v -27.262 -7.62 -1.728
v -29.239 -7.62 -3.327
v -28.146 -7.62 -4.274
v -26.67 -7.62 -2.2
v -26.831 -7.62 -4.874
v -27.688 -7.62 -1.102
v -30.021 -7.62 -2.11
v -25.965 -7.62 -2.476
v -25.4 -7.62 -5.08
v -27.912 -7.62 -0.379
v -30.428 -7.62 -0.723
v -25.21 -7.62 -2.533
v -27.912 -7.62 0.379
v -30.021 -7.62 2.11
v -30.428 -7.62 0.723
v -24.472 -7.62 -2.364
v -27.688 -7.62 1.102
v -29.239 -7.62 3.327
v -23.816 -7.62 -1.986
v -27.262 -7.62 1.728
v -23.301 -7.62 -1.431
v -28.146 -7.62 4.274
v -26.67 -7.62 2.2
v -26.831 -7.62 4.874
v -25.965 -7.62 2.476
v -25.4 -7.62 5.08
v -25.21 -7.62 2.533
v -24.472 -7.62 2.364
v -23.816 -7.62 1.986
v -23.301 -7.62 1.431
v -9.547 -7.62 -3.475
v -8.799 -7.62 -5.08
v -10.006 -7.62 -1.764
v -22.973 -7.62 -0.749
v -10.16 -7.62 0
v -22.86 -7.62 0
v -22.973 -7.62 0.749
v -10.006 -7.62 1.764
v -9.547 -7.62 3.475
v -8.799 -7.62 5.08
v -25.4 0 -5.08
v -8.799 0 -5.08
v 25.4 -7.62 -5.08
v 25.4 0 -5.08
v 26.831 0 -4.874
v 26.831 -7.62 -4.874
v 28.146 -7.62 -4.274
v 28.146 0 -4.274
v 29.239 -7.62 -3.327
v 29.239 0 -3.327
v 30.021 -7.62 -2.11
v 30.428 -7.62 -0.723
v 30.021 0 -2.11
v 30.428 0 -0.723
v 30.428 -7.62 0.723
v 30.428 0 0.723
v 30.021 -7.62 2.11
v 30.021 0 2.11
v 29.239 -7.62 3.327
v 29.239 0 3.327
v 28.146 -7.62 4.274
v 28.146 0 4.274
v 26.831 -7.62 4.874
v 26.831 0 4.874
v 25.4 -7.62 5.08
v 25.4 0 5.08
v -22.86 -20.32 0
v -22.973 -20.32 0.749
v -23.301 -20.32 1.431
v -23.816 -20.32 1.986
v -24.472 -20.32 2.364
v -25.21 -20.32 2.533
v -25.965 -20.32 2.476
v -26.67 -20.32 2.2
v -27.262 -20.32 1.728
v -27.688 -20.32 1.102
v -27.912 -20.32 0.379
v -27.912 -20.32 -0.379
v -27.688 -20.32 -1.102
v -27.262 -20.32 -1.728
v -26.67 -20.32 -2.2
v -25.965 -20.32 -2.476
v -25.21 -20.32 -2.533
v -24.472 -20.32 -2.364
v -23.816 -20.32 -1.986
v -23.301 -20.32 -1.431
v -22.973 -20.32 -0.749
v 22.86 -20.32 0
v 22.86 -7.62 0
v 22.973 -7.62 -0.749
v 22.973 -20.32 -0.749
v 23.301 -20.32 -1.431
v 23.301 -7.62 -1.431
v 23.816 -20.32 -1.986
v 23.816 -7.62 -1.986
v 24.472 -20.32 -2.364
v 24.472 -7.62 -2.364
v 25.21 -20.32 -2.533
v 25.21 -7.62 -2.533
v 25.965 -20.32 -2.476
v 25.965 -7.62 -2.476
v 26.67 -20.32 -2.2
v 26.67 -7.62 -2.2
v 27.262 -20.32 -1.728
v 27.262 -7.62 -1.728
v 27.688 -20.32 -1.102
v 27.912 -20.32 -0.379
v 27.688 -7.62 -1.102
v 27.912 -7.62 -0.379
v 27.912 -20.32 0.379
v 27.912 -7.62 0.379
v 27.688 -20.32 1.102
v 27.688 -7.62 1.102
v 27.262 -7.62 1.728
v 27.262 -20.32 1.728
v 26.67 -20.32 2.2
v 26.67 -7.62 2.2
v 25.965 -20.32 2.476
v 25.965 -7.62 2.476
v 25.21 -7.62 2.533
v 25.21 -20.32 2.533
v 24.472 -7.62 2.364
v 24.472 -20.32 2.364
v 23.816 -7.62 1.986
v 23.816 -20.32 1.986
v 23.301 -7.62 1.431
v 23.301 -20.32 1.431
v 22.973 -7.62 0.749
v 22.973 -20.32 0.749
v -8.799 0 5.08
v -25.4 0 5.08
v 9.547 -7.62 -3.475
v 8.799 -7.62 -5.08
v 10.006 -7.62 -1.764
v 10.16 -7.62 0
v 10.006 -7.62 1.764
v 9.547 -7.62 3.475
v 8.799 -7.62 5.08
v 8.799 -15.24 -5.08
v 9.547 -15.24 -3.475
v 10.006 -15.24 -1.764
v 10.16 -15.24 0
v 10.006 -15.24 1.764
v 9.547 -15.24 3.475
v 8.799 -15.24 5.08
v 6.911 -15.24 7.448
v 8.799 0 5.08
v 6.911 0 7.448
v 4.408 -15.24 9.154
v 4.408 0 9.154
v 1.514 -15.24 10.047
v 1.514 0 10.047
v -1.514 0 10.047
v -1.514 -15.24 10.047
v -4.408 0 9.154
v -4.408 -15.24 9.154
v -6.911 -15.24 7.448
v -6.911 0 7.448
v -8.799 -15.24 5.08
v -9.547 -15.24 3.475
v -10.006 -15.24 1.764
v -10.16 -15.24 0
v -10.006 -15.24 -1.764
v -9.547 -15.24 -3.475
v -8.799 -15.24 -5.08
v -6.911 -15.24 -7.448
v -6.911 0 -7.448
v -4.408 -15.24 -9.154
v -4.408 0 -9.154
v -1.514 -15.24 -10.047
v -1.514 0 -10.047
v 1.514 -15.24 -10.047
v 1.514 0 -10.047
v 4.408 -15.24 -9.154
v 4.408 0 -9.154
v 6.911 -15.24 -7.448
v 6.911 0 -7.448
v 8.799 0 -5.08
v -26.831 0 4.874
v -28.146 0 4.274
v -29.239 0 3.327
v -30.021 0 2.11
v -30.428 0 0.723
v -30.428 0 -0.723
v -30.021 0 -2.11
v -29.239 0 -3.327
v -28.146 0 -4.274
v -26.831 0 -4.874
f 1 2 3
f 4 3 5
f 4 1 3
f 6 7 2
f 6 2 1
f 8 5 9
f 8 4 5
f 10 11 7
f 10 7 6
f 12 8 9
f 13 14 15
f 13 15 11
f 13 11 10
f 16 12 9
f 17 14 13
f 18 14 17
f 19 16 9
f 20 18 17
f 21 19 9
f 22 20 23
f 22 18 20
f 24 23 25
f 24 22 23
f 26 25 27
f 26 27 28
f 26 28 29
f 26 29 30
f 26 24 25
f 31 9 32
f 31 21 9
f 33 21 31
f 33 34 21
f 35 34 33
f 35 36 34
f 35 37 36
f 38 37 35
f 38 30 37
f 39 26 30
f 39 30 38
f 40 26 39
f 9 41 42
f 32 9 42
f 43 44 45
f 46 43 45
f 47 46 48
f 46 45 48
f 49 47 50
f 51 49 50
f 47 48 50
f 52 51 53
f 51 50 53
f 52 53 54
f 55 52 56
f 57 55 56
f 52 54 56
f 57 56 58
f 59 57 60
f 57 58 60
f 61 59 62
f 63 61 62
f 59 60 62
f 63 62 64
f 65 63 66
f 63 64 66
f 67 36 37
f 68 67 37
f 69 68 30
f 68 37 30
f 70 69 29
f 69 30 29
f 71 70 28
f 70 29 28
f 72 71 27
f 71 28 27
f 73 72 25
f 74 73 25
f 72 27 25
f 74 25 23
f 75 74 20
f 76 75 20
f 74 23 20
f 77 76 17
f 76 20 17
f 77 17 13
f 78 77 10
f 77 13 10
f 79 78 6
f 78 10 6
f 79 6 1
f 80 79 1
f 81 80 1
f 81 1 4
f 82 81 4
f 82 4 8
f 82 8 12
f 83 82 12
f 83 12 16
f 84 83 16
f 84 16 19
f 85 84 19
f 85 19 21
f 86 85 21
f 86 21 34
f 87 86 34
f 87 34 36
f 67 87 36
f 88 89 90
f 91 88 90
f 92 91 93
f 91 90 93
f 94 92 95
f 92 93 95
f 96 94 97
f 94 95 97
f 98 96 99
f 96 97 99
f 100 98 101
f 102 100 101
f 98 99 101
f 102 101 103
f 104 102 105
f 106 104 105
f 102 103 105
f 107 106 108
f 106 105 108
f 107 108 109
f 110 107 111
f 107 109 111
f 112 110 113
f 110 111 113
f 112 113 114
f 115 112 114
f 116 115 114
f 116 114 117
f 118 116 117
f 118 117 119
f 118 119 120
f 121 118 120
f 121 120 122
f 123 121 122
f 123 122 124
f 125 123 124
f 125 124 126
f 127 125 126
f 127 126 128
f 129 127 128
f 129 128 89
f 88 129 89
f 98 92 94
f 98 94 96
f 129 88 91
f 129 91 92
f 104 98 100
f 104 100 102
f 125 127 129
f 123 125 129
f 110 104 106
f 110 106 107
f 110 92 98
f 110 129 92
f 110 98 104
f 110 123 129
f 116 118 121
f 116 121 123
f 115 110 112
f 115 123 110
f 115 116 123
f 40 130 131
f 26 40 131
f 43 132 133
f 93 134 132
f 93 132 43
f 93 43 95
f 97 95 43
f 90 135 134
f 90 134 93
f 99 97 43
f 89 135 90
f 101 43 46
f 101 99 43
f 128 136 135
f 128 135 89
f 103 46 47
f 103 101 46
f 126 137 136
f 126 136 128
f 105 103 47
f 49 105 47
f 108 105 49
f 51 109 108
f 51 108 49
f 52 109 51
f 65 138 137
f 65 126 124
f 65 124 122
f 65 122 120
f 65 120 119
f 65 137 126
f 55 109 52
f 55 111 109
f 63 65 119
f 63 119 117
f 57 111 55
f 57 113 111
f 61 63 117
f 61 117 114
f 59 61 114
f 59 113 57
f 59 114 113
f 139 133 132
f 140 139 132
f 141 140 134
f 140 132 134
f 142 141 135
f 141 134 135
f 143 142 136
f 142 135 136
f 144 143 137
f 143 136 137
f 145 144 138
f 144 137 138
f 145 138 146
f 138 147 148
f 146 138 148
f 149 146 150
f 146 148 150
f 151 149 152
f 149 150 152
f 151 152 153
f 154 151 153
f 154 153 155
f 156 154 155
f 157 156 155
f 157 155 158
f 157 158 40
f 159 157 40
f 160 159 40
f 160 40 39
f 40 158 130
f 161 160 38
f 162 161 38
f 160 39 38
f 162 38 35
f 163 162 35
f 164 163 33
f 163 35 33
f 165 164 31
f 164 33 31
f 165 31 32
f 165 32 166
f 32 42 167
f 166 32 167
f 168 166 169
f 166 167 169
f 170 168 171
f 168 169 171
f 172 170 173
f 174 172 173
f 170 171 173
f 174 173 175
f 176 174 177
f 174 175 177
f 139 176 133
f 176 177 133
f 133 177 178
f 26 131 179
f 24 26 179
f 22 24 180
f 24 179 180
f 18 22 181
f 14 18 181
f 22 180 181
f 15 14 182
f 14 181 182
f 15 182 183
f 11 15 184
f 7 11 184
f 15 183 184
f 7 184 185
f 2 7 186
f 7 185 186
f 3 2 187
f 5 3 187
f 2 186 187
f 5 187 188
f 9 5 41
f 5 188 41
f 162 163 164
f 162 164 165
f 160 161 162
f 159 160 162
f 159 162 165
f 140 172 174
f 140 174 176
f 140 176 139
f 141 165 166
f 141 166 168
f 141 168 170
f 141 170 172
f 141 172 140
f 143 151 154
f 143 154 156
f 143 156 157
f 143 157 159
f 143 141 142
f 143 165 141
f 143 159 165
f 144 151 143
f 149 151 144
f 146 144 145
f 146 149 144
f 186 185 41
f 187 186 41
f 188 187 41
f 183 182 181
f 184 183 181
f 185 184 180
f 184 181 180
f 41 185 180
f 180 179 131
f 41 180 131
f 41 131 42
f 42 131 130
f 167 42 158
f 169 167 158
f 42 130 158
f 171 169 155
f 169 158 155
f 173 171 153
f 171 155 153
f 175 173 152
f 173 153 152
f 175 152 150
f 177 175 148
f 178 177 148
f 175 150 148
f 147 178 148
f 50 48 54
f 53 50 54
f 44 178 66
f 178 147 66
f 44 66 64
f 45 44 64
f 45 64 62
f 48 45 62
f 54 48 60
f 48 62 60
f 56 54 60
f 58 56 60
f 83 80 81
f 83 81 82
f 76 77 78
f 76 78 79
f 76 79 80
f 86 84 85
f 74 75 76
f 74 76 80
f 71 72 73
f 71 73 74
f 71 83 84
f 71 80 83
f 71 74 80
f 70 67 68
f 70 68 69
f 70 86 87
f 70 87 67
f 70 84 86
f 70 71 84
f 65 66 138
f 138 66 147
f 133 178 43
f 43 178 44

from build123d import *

# Parameters (mm, degrees)
F0_R     = 2.54
F1_DEPTH = 7.62
F2_DEPTH = 15.24
F3_DEPTH = 20.32


with BuildPart() as f1:
    # F0 (on Front) → F1 (new body)
    with BuildSketch(Plane.XZ):
        with BuildLine():
            ThreePointArc((-8.7988181024, -5.08), (-9.8138063951, -2.6296014982), (-10.16, 0))
            ThreePointArc((-10.16, 0), (-9.8138063951, 2.6296014982), (-8.7988181024, 5.08))
            Line((-8.7988181024, 5.08), (-25.4, 5.08))
            ThreePointArc((-25.4, 5.08), (-30.48, 0), (-25.4, -5.08))
            Line((-25.4, -5.08), (-8.7988181024, -5.08))
        make_face()
        with Locations((-25.4, 0)):
            Circle(F0_R, mode=Mode.SUBTRACT)
        with Locations((-25.4, 0)):
            Circle(F0_R)
        with BuildLine():
            Line((-10.16, 0), (10.16, 0))
            ThreePointArc((10.16, 0), (9.8138063951, 2.6296014982), (8.7988181025, 5.08))
            Line((8.7988181025, 5.08), (-8.7988181024, 5.08))
            ThreePointArc((-8.7988181024, 5.08), (-9.8138063951, 2.6296014982), (-10.16, 0))
        make_face()
        with BuildLine():
            ThreePointArc((8.7988181025, -5.08), (9.8138063951, -2.6296014982), (10.16, 0))
            Line((10.16, 0), (-10.16, 0))
            ThreePointArc((-10.16, 0), (-9.8138063951, -2.6296014982), (-8.7988181024, -5.08))
            Line((-8.7988181024, -5.08), (8.7988181025, -5.08))
        make_face()
        with BuildLine():
            ThreePointArc((8.7988181025, 5.08), (9.8138063951, 2.6296014982), (10.16, 0))
            ThreePointArc((10.16, 0), (9.8138063951, -2.6296014982), (8.7988181025, -5.08))
            Line((8.7988181025, -5.08), (25.4, -5.08))
            ThreePointArc((25.4, -5.08), (30.48, 0), (25.4, 5.08))
            Line((25.4, 5.08), (8.7988181025, 5.08))
        make_face()
        with BuildLine():
            ThreePointArc((27.94, 0), (25.4, -2.54), (22.86, 0))
            ThreePointArc((22.86, 0), (25.4, 2.54), (27.94, 0))
        make_face(mode=Mode.SUBTRACT)
        with BuildLine():
            ThreePointArc((27.94, 0), (25.4, 2.54), (22.86, 0))
            ThreePointArc((22.86, 0), (25.4, -2.54), (27.94, 0))
        make_face()
        with BuildLine():
            Line((-8.7988181024, 5.08), (8.7988181025, 5.08))
            ThreePointArc((8.7988181025, 5.08), (0, 10.16), (-8.7988181024, 5.08))
        make_face()
        with BuildLine():
            ThreePointArc((-8.7988181024, -5.08), (0, -10.16), (8.7988181025, -5.08))
            Line((8.7988181025, -5.08), (-8.7988181024, -5.08))
        make_face()
    extrude(amount=F1_DEPTH)

    # F0 (on Front) → F2 (join)
    with BuildSketch(Plane.XZ):
        with BuildLine():
            Line((-8.7988181024, 5.08), (8.7988181025, 5.08))
            ThreePointArc((8.7988181025, 5.08), (0, 10.16), (-8.7988181024, 5.08))
        make_face()
        with BuildLine():
            Line((-10.16, 0), (10.16, 0))
            ThreePointArc((10.16, 0), (9.8138063951, 2.6296014982), (8.7988181025, 5.08))
            Line((8.7988181025, 5.08), (-8.7988181024, 5.08))
            ThreePointArc((-8.7988181024, 5.08), (-9.8138063951, 2.6296014982), (-10.16, 0))
        make_face()
        with BuildLine():
            ThreePointArc((8.7988181025, -5.08), (9.8138063951, -2.6296014982), (10.16, 0))
            Line((10.16, 0), (-10.16, 0))
            ThreePointArc((-10.16, 0), (-9.8138063951, -2.6296014982), (-8.7988181024, -5.08))
            Line((-8.7988181024, -5.08), (8.7988181025, -5.08))
        make_face()
        with BuildLine():
            ThreePointArc((-8.7988181024, -5.08), (0, -10.16), (8.7988181025, -5.08))
            Line((8.7988181025, -5.08), (-8.7988181024, -5.08))
        make_face()
    extrude(amount=F2_DEPTH)

    # F0 (on Front) → F3 (join)
    with BuildSketch(Plane.XZ):
        with Locations((-25.4, 0)):
            Circle(F0_R)
        with BuildLine():
            ThreePointArc((27.94, 0), (25.4, 2.54), (22.86, 0))
            ThreePointArc((22.86, 0), (25.4, -2.54), (27.94, 0))
        make_face()
    extrude(amount=F3_DEPTH)


solid = f1.part
